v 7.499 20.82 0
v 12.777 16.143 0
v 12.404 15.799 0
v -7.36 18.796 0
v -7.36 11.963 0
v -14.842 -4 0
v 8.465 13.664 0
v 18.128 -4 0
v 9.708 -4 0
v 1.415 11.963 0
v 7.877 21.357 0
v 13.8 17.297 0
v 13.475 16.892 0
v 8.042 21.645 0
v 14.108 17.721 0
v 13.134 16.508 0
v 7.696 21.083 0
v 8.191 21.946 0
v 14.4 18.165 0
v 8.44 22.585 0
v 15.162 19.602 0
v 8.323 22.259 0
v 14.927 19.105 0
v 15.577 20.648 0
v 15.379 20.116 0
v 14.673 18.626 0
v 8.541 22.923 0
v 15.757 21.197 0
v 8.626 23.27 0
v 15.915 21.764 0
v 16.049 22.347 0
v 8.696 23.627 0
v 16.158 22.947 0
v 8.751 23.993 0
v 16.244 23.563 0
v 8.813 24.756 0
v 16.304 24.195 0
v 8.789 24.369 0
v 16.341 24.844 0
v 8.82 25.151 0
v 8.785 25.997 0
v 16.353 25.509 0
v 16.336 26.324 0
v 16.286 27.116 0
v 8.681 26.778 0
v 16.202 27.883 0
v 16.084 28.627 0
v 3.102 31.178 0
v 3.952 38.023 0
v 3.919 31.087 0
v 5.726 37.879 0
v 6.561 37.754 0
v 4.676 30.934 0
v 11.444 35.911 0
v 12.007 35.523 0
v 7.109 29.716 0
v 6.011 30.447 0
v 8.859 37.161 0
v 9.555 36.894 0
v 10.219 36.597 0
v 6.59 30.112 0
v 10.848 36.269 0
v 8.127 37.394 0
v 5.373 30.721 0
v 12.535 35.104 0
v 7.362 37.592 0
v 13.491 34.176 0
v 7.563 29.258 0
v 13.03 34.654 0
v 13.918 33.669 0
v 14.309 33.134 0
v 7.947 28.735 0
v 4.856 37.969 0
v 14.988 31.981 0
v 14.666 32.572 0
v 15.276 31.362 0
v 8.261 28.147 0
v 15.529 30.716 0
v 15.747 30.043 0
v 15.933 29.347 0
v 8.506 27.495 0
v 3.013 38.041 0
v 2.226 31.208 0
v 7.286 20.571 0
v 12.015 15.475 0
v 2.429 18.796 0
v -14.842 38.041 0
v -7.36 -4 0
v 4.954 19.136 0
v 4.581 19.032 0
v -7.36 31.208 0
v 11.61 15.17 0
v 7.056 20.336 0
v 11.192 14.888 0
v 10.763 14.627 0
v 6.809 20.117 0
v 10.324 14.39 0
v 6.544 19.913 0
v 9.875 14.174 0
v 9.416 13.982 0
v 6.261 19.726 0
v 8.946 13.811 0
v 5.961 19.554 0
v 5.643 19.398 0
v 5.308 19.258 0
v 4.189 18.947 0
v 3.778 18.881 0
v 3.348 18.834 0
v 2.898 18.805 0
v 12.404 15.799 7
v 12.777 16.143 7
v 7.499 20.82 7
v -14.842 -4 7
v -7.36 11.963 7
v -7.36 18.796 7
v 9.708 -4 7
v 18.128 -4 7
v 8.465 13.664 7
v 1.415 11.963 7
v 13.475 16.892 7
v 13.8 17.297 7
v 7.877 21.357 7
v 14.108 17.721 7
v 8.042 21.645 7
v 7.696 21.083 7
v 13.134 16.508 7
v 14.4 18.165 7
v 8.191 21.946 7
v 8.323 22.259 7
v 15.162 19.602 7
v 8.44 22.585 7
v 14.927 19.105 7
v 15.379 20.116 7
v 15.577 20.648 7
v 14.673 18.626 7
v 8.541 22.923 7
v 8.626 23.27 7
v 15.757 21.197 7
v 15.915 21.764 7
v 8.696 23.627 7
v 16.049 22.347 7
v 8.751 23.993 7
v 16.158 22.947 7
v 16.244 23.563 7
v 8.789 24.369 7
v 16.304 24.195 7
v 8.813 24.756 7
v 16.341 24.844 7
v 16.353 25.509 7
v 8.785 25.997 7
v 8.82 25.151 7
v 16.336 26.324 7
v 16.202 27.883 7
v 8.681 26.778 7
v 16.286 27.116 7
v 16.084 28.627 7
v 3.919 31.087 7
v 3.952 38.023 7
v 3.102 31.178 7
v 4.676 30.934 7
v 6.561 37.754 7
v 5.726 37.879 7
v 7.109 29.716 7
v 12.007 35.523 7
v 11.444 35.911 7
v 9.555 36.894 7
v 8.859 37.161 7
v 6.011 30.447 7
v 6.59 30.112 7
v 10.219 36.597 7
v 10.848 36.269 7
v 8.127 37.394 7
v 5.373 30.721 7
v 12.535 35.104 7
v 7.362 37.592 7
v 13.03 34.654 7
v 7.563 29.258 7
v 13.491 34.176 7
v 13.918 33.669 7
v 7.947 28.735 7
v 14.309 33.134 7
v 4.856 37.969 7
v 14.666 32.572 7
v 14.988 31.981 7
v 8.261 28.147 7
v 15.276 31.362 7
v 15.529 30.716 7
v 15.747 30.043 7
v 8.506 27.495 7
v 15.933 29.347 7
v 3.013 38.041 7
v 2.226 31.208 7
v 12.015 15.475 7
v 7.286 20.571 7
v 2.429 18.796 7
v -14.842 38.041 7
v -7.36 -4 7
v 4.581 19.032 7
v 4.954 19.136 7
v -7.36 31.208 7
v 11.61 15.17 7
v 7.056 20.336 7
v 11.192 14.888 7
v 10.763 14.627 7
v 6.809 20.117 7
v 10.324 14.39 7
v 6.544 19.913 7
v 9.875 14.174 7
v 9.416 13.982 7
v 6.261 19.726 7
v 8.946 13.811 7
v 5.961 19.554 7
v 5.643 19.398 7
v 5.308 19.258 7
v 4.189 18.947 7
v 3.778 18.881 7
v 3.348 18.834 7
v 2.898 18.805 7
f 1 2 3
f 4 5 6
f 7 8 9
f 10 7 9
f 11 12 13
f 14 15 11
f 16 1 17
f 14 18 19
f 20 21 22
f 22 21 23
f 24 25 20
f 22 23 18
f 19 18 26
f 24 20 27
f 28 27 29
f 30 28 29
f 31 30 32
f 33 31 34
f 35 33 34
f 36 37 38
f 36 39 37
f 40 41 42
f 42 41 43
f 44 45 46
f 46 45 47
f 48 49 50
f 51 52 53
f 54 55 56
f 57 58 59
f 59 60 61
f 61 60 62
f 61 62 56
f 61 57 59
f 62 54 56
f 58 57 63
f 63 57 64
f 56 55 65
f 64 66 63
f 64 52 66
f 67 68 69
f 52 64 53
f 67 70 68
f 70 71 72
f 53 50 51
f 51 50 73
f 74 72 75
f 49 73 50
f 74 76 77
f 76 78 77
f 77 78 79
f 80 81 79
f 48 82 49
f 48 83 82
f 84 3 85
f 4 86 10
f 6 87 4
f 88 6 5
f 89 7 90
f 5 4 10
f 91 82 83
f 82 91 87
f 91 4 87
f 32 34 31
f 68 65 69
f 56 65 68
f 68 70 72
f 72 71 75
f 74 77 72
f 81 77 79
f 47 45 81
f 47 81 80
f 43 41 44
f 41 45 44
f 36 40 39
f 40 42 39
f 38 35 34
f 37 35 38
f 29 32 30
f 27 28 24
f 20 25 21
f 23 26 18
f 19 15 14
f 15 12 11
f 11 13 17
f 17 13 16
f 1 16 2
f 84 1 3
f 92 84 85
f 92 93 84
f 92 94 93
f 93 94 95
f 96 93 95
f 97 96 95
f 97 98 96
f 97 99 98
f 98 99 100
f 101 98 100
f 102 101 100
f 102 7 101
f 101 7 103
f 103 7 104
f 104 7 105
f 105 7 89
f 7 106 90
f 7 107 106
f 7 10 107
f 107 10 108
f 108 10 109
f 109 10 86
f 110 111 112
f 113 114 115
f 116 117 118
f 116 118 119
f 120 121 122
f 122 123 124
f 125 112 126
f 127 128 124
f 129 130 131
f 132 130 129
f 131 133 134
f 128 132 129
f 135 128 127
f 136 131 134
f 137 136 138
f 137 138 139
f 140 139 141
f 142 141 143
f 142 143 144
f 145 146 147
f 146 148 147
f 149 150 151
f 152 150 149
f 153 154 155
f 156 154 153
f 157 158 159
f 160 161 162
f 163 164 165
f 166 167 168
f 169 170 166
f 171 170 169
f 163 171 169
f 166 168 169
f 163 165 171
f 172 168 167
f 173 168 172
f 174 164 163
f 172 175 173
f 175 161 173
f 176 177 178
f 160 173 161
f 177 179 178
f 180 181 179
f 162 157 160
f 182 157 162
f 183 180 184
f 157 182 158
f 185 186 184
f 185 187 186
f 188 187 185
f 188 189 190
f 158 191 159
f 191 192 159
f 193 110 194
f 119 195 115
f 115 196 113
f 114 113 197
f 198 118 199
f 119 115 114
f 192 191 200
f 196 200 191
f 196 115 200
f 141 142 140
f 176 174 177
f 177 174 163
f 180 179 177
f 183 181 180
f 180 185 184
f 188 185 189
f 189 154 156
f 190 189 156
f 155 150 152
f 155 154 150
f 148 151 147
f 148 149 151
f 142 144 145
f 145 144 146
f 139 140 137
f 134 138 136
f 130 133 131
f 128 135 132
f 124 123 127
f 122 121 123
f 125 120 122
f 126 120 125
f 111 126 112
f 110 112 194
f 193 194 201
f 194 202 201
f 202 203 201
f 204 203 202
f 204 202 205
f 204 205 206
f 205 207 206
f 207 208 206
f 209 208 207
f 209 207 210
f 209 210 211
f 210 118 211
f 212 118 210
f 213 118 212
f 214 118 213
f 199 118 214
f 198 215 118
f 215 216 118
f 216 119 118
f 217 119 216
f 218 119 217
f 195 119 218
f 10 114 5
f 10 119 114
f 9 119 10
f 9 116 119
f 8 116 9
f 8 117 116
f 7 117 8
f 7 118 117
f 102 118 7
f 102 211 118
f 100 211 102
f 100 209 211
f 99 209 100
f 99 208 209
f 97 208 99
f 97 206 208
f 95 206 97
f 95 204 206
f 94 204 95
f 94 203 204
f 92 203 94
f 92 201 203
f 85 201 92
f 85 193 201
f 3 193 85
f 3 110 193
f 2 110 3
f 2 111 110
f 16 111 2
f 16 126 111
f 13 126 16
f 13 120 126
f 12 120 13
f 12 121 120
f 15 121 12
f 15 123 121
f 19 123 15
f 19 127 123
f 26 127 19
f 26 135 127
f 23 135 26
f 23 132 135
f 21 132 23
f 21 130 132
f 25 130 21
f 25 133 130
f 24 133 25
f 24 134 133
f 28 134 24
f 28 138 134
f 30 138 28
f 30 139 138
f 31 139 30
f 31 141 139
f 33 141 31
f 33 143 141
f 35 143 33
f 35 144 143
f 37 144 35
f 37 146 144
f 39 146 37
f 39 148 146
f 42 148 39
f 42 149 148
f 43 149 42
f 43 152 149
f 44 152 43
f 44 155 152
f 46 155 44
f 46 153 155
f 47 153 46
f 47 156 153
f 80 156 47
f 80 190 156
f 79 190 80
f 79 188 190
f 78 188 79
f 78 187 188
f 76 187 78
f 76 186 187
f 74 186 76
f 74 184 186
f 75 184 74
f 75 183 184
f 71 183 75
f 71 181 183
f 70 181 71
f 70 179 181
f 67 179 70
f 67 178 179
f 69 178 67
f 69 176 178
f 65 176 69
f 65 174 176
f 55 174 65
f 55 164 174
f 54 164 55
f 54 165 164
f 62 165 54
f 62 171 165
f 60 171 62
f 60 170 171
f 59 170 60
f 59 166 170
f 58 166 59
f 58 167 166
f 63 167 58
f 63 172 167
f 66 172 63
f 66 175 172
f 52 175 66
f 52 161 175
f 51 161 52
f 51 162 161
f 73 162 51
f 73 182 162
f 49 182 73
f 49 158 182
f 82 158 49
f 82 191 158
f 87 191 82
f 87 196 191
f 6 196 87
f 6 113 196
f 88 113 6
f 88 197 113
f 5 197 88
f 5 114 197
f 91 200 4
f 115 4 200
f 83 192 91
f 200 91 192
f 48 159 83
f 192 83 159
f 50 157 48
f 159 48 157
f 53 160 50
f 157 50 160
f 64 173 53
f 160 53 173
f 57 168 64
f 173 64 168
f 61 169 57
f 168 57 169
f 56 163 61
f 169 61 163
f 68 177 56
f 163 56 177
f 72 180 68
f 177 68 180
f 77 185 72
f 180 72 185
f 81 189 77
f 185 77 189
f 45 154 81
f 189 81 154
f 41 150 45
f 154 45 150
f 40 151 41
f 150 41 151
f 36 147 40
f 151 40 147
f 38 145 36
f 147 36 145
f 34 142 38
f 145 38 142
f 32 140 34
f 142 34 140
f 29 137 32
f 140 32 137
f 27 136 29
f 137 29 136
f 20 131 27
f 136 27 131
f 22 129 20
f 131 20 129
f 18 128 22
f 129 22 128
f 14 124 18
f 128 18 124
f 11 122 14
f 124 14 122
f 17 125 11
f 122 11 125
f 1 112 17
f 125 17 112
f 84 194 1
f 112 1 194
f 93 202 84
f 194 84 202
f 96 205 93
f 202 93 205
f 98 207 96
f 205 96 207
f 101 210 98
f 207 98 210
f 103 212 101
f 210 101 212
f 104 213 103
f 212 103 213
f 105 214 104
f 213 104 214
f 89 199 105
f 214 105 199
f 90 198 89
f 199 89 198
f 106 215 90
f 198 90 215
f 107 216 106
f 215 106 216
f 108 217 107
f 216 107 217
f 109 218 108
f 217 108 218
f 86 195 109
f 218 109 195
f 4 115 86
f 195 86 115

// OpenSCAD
// file: glyph.scad
// glyph — the shared geometry of every letter in the set. Defines named geometry
// only, so it renders nothing on its own; each letter part includes it and calls
// letter(). Every dimension lives in ../../lib/common.scad.
//
// A LETTER IS NOTHING BUT A LETTER. No plinth, no tongue, no tab — it is the
// bare glyph, and it attaches by standing in the deck groove and resting on the
// groove's floor. Anything else on it would be a distraction on a learning toy.
//
// It is a flat plate of one thickness, printed face-down: no overhang anywhere,
// no supports, and the face on the bed comes out smoothest.
//
// TWO TRAPS WITH text():
//
//  * A missing font FALLS BACK SILENTLY — no warning, no error, just different
//    letters. "Liberation Sans" was the first choice here because OpenSCAD
//    bundles it; on macOS the bundled faces are not registered with fontconfig,
//    so it rendered the fallback face instead and nothing said so. To check a
//    font resolved, render a string with it and with a deliberately bogus name
//    and compare bounding boxes: identical means it fell back.
//  * `size` is not the cap height in general. For Helvetica Bold they coincide
//    (size 44 -> 44.0 mm cap), which is why letter_size reads as a height.
//    Change the font and re-measure.

include <../../lib/common.scad>

// The letter's outline, upright in the XY plane, ready to be extruded along Z
// (which is the letter's thickness, and the print's build axis).
//
//   y = 0   is the deck surface
//   y < 0   is the part standing down inside the groove. It reaches letter_bury,
//           which is where the tapered groove closes to letter_t — NOT the
//           groove's floor. The letter wedges; it never bottoms out.
module glyph_2d(ch) {
    intersection() {
        translate([0, -letter_bury])
            scale([letter_condense, 1])
                text(ch, size = letter_size, font = letter_font,
                     halign = "center", valign = "baseline");
        // Trimmed flat at the baseline. Round letters (O, C, G, S) overshoot the
        // baseline by design, and a letter standing on a convex curve rocks —
        // there is nothing to stop it leaning. The trim costs nothing visible
        // and gives every letter a flat foot on the groove floor.
        translate([-200, -letter_bury]) square([400, 400]);
    }
}

// One letter, in its print orientation: lying on its face, thickness up Z.
module letter(ch) {
    linear_extrude(letter_t) glyph_2d(ch);
}

// Where that letter sits once it is dropped into a chassis, for fit checks.
module letter_fitted(ch) {
    translate([0, letter_t/2, body_top]) rotate([90, 0, 0]) letter(ch);
}
// main file
// letter R — one part. See glyph.scad for the geometry and lib/common.scad for
// the dimensions. Prints lying on its face, exactly as exported: no supports.

include <glyph.scad>

letter("R");
